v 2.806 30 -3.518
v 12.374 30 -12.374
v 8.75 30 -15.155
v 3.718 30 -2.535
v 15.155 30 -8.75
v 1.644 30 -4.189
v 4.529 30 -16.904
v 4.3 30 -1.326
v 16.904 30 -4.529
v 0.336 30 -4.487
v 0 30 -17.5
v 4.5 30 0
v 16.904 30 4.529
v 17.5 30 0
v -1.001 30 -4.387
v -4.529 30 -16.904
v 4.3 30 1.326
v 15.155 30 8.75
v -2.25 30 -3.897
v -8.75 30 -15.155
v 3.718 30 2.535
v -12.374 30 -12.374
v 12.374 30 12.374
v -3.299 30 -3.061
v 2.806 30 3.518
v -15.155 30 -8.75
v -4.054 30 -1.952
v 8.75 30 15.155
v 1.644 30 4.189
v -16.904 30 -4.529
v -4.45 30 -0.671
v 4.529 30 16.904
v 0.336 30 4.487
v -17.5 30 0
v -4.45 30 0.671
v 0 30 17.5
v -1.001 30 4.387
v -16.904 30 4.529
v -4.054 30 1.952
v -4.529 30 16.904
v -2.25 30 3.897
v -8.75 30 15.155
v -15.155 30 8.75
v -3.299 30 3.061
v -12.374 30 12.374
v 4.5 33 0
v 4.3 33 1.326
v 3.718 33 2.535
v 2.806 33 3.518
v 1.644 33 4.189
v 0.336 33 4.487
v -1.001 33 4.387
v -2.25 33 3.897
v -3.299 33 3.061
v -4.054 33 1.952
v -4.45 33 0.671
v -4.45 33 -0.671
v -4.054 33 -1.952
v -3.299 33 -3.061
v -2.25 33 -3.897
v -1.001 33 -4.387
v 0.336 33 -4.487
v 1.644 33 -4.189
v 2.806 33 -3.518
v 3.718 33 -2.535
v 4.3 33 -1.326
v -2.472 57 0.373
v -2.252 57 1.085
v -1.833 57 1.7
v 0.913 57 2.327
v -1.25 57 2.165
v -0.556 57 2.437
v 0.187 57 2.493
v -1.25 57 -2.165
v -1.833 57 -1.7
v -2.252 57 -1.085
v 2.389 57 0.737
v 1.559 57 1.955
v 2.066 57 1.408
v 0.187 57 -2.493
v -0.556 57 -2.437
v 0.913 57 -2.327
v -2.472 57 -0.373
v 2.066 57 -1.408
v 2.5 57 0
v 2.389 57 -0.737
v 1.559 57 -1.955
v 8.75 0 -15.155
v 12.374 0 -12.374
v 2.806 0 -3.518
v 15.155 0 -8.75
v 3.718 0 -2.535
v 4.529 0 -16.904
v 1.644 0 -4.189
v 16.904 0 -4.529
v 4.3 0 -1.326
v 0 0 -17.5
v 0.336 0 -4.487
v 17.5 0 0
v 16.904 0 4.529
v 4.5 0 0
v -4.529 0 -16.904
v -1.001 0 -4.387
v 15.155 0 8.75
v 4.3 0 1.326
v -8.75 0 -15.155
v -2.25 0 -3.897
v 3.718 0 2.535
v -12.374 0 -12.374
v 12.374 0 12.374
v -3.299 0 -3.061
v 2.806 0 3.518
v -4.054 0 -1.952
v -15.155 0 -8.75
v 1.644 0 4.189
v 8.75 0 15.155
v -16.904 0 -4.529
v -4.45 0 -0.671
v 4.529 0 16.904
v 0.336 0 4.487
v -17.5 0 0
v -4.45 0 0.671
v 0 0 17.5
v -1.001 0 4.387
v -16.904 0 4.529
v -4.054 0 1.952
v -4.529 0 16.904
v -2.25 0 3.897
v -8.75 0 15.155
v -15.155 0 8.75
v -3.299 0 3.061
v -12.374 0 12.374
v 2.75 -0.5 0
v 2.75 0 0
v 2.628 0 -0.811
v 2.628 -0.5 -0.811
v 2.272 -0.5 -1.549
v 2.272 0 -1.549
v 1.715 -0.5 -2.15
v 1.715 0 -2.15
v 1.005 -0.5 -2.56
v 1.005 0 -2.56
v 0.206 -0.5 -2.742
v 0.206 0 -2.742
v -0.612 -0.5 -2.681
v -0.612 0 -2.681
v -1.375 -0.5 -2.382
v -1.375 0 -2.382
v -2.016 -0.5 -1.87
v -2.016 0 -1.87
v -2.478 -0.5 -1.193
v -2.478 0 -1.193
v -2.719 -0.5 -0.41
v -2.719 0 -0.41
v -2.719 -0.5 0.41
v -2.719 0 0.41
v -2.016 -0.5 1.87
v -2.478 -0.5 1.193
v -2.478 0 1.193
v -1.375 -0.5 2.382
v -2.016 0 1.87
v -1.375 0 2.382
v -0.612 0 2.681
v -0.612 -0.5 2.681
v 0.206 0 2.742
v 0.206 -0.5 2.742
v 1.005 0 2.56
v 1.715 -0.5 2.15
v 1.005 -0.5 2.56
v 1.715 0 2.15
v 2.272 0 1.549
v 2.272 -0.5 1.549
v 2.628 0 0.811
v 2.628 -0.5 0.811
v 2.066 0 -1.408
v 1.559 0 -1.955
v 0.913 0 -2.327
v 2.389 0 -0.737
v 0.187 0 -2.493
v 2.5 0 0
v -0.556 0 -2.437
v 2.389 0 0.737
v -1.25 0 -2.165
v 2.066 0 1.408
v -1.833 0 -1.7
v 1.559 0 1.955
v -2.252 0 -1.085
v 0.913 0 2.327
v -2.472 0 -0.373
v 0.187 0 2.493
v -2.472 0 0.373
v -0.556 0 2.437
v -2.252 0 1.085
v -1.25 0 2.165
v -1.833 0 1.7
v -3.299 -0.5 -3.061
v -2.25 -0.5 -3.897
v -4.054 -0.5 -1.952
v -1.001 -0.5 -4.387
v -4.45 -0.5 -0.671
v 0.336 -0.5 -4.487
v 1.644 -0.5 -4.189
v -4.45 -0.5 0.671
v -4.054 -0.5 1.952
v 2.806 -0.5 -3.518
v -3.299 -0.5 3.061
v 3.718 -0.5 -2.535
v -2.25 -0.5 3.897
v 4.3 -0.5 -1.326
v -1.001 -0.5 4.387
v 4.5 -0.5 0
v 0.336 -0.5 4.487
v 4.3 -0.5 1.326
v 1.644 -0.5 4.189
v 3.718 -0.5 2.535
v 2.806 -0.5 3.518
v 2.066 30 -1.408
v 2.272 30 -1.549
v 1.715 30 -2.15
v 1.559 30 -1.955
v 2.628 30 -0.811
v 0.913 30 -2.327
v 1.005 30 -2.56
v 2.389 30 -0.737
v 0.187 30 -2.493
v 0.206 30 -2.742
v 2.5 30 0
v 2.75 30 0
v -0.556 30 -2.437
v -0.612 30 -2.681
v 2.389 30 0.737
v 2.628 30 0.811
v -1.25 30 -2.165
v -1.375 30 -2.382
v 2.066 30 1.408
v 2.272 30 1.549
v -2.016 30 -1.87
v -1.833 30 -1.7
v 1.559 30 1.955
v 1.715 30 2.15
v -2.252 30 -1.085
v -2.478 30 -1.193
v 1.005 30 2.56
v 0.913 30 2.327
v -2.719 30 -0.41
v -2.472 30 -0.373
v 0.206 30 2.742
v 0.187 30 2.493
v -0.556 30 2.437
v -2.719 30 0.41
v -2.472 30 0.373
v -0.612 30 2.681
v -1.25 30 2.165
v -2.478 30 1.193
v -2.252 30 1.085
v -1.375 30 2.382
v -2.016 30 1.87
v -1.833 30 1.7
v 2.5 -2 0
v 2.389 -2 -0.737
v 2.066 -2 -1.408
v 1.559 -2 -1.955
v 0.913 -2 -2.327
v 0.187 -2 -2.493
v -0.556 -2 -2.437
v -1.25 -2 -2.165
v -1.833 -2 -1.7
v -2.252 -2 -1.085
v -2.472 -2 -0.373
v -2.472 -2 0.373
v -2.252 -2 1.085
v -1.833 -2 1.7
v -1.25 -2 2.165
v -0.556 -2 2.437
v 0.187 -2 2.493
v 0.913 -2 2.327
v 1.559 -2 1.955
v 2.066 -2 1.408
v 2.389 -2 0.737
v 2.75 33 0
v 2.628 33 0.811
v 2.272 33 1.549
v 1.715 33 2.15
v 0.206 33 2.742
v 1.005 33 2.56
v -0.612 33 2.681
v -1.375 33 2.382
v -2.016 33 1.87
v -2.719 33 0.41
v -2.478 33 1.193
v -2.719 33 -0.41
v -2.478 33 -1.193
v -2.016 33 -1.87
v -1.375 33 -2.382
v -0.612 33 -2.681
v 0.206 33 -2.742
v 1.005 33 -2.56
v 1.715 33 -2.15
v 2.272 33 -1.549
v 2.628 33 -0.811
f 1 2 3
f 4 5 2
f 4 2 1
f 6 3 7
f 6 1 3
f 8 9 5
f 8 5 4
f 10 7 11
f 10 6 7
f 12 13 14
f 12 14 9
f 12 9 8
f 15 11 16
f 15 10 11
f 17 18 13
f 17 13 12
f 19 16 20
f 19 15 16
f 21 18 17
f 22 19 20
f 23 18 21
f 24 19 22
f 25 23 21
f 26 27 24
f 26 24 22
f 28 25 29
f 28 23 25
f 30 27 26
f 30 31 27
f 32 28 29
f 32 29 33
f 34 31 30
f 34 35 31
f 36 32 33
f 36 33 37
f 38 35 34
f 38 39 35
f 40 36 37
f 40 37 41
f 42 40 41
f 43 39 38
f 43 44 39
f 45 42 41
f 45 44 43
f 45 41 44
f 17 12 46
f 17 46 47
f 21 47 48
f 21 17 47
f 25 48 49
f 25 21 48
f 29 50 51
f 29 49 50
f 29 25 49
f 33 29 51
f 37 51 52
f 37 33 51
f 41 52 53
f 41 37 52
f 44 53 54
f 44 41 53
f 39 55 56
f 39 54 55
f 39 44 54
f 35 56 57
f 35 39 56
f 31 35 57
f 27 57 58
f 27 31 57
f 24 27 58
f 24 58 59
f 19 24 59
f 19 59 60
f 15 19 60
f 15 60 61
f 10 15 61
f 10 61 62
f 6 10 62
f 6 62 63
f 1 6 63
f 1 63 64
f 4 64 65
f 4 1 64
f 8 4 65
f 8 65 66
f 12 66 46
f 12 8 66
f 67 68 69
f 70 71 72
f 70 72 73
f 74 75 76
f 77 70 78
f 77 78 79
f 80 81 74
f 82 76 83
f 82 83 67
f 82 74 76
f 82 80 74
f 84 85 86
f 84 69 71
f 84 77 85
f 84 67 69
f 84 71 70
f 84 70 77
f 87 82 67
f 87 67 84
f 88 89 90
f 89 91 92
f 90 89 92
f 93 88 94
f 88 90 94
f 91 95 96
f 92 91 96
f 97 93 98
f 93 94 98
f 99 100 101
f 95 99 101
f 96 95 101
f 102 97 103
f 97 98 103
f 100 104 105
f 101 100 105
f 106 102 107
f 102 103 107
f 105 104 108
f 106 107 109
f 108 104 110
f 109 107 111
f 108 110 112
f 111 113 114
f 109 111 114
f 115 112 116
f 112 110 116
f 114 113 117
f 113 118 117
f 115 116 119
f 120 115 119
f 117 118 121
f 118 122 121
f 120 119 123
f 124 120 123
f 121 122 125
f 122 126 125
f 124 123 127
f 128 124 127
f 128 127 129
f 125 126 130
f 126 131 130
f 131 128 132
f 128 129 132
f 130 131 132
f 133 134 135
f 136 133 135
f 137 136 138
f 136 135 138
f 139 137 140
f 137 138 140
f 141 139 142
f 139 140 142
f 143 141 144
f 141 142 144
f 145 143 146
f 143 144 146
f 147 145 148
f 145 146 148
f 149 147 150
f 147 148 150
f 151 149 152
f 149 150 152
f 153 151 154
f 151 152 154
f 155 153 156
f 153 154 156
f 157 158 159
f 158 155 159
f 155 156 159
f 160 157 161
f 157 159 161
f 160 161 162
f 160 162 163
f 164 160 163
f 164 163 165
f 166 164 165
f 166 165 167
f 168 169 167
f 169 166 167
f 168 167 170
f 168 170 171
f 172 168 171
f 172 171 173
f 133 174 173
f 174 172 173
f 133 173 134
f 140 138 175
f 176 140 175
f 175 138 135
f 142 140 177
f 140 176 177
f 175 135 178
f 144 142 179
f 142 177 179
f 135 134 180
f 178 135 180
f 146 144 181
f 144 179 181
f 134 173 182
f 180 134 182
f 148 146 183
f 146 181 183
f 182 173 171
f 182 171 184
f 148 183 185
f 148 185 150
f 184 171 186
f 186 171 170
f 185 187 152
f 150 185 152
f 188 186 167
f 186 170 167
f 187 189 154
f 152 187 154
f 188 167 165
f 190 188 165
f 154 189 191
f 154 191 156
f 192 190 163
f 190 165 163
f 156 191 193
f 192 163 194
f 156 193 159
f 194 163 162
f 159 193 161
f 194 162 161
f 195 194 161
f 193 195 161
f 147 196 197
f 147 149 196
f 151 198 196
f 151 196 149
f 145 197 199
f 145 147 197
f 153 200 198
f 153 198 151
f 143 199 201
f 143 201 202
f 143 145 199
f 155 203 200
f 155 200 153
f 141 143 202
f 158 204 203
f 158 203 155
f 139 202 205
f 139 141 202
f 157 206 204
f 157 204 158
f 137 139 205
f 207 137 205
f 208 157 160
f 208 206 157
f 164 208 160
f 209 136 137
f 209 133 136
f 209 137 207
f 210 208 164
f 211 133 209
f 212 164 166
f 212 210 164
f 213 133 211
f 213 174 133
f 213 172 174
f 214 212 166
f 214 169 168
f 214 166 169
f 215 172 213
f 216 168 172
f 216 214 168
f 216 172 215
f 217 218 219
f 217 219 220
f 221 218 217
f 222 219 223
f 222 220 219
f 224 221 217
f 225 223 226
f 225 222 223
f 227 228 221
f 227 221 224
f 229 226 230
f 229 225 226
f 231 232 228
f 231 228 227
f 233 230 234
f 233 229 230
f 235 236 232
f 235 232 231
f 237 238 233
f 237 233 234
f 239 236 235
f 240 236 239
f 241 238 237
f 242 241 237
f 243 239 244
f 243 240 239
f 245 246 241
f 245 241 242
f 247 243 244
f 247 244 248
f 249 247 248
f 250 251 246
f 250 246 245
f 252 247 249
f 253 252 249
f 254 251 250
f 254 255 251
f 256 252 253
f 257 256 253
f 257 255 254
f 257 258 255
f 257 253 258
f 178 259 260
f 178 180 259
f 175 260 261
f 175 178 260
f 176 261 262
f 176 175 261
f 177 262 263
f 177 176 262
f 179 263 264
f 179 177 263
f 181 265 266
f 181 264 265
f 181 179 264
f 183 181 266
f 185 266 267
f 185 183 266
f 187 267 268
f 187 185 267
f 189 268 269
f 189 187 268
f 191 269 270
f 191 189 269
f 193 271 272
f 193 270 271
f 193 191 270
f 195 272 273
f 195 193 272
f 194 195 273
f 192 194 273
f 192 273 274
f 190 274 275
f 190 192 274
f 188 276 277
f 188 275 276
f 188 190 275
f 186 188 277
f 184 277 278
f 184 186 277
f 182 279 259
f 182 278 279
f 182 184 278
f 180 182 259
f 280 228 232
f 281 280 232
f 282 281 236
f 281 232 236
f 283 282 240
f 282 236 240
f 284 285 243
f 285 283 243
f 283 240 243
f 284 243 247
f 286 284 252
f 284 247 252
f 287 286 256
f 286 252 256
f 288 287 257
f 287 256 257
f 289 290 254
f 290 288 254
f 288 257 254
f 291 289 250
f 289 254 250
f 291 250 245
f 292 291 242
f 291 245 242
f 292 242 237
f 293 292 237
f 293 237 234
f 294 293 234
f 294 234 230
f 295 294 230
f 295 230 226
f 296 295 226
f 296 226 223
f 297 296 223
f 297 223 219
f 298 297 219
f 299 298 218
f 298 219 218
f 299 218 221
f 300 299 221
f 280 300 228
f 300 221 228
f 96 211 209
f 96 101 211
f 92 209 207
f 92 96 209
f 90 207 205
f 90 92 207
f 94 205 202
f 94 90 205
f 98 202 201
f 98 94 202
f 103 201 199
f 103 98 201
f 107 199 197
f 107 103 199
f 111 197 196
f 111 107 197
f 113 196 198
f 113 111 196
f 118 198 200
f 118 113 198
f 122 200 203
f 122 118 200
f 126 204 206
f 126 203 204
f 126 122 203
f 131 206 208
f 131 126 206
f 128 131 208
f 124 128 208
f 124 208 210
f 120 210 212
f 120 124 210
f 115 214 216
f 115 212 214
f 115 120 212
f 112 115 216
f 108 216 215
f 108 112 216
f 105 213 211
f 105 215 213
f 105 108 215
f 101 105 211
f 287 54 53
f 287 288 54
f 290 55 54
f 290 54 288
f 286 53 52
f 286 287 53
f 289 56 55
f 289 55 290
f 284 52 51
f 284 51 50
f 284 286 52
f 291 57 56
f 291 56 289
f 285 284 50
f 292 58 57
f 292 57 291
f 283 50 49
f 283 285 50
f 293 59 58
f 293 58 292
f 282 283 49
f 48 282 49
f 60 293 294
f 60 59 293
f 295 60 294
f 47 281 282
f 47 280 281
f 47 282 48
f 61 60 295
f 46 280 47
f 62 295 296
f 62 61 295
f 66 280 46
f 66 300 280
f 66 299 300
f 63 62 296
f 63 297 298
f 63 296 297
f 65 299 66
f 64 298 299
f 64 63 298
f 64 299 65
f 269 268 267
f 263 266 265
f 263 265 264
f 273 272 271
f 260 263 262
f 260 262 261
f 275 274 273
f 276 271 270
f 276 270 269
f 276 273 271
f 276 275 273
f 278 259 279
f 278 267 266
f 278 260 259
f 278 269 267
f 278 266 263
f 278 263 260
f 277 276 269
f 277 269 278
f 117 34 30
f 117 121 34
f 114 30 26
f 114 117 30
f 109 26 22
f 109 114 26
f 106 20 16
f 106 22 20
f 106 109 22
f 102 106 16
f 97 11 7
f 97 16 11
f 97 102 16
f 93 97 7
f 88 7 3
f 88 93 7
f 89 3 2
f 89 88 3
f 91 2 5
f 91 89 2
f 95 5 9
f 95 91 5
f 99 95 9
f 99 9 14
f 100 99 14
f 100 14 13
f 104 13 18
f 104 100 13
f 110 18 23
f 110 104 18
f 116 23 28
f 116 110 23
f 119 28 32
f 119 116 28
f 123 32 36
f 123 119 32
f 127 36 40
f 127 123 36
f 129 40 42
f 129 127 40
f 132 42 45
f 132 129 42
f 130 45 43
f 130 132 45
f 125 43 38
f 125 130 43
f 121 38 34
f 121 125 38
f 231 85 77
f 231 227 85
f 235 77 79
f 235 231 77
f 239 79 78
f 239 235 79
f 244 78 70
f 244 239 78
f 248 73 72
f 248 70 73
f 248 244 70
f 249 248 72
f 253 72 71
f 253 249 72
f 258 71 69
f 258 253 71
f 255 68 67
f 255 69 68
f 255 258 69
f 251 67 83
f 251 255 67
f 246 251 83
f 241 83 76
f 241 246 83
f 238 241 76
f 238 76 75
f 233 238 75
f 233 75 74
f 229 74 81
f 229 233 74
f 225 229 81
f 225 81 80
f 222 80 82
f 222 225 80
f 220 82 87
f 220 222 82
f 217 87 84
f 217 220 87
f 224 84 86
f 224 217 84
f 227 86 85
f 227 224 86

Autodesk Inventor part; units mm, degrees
ref_plane "YZ Plane" through (0, 0, 0) normal (1, 0, 0) x (0, 1, 0)
ref_plane "XZ Plane" through (0, 0, 0) normal (0, 1, 0) x (-1, 0, 0)
ref_plane "XY Plane" through (0, 0, 0) normal (0, 0, 1) x (1, 0, 0)
sketch "Sketch1" plane through (0, 0, 0) normal (0, 1, 0) x (-1, 0, 0)
  circle A0 centre (0, 0) radius 17.5
  dimension "d0" = 35
extrude "Extrusion1" add sketch "Sketch1" along normal blind 30
sketch "Sketch2" plane through (0, 0, 0) normal (0, -1, 0) x (1, 0, 0)
  circle A0 centre (0, 0) radius 2.5
  dimension "d3" = 5
extrude "Extrusion2" add sketch "Sketch2" along normal blind 2
sketch "Sketch3" plane through (0, 30, 0) normal (0, 1, 0) x (1, 0, 0)
  circle A0 centre (0, 0) radius 2.5
  dimension "d6" = 5
extrude "Extrusion3" add sketch "Sketch3" along normal blind 27
sketch "Sketch4" plane through (0, 30, 0) normal (0, 1, 0) x (1, 0, 0)
  circle A0 centre (0, 0) radius 4.5
  circle A1 centre (0, 0) radius 2.75
  dimension "d9" = 9
  dimension "d12" = 5.5
extrude "Extrusion5" add sketch "Sketch4" along normal blind 3
sketch "Sketch5" plane through (0, 0, 0) normal (0, -1, 0) x (1, 0, 0)
  circle A0 centre (0, 0) radius 2.75
  circle A1 centre (0, 0) radius 4.5
  dimension "d15" = 5.5
  dimension "d16" = 9
extrude "Extrusion6" add sketch "Sketch5" along normal blind 0.5
